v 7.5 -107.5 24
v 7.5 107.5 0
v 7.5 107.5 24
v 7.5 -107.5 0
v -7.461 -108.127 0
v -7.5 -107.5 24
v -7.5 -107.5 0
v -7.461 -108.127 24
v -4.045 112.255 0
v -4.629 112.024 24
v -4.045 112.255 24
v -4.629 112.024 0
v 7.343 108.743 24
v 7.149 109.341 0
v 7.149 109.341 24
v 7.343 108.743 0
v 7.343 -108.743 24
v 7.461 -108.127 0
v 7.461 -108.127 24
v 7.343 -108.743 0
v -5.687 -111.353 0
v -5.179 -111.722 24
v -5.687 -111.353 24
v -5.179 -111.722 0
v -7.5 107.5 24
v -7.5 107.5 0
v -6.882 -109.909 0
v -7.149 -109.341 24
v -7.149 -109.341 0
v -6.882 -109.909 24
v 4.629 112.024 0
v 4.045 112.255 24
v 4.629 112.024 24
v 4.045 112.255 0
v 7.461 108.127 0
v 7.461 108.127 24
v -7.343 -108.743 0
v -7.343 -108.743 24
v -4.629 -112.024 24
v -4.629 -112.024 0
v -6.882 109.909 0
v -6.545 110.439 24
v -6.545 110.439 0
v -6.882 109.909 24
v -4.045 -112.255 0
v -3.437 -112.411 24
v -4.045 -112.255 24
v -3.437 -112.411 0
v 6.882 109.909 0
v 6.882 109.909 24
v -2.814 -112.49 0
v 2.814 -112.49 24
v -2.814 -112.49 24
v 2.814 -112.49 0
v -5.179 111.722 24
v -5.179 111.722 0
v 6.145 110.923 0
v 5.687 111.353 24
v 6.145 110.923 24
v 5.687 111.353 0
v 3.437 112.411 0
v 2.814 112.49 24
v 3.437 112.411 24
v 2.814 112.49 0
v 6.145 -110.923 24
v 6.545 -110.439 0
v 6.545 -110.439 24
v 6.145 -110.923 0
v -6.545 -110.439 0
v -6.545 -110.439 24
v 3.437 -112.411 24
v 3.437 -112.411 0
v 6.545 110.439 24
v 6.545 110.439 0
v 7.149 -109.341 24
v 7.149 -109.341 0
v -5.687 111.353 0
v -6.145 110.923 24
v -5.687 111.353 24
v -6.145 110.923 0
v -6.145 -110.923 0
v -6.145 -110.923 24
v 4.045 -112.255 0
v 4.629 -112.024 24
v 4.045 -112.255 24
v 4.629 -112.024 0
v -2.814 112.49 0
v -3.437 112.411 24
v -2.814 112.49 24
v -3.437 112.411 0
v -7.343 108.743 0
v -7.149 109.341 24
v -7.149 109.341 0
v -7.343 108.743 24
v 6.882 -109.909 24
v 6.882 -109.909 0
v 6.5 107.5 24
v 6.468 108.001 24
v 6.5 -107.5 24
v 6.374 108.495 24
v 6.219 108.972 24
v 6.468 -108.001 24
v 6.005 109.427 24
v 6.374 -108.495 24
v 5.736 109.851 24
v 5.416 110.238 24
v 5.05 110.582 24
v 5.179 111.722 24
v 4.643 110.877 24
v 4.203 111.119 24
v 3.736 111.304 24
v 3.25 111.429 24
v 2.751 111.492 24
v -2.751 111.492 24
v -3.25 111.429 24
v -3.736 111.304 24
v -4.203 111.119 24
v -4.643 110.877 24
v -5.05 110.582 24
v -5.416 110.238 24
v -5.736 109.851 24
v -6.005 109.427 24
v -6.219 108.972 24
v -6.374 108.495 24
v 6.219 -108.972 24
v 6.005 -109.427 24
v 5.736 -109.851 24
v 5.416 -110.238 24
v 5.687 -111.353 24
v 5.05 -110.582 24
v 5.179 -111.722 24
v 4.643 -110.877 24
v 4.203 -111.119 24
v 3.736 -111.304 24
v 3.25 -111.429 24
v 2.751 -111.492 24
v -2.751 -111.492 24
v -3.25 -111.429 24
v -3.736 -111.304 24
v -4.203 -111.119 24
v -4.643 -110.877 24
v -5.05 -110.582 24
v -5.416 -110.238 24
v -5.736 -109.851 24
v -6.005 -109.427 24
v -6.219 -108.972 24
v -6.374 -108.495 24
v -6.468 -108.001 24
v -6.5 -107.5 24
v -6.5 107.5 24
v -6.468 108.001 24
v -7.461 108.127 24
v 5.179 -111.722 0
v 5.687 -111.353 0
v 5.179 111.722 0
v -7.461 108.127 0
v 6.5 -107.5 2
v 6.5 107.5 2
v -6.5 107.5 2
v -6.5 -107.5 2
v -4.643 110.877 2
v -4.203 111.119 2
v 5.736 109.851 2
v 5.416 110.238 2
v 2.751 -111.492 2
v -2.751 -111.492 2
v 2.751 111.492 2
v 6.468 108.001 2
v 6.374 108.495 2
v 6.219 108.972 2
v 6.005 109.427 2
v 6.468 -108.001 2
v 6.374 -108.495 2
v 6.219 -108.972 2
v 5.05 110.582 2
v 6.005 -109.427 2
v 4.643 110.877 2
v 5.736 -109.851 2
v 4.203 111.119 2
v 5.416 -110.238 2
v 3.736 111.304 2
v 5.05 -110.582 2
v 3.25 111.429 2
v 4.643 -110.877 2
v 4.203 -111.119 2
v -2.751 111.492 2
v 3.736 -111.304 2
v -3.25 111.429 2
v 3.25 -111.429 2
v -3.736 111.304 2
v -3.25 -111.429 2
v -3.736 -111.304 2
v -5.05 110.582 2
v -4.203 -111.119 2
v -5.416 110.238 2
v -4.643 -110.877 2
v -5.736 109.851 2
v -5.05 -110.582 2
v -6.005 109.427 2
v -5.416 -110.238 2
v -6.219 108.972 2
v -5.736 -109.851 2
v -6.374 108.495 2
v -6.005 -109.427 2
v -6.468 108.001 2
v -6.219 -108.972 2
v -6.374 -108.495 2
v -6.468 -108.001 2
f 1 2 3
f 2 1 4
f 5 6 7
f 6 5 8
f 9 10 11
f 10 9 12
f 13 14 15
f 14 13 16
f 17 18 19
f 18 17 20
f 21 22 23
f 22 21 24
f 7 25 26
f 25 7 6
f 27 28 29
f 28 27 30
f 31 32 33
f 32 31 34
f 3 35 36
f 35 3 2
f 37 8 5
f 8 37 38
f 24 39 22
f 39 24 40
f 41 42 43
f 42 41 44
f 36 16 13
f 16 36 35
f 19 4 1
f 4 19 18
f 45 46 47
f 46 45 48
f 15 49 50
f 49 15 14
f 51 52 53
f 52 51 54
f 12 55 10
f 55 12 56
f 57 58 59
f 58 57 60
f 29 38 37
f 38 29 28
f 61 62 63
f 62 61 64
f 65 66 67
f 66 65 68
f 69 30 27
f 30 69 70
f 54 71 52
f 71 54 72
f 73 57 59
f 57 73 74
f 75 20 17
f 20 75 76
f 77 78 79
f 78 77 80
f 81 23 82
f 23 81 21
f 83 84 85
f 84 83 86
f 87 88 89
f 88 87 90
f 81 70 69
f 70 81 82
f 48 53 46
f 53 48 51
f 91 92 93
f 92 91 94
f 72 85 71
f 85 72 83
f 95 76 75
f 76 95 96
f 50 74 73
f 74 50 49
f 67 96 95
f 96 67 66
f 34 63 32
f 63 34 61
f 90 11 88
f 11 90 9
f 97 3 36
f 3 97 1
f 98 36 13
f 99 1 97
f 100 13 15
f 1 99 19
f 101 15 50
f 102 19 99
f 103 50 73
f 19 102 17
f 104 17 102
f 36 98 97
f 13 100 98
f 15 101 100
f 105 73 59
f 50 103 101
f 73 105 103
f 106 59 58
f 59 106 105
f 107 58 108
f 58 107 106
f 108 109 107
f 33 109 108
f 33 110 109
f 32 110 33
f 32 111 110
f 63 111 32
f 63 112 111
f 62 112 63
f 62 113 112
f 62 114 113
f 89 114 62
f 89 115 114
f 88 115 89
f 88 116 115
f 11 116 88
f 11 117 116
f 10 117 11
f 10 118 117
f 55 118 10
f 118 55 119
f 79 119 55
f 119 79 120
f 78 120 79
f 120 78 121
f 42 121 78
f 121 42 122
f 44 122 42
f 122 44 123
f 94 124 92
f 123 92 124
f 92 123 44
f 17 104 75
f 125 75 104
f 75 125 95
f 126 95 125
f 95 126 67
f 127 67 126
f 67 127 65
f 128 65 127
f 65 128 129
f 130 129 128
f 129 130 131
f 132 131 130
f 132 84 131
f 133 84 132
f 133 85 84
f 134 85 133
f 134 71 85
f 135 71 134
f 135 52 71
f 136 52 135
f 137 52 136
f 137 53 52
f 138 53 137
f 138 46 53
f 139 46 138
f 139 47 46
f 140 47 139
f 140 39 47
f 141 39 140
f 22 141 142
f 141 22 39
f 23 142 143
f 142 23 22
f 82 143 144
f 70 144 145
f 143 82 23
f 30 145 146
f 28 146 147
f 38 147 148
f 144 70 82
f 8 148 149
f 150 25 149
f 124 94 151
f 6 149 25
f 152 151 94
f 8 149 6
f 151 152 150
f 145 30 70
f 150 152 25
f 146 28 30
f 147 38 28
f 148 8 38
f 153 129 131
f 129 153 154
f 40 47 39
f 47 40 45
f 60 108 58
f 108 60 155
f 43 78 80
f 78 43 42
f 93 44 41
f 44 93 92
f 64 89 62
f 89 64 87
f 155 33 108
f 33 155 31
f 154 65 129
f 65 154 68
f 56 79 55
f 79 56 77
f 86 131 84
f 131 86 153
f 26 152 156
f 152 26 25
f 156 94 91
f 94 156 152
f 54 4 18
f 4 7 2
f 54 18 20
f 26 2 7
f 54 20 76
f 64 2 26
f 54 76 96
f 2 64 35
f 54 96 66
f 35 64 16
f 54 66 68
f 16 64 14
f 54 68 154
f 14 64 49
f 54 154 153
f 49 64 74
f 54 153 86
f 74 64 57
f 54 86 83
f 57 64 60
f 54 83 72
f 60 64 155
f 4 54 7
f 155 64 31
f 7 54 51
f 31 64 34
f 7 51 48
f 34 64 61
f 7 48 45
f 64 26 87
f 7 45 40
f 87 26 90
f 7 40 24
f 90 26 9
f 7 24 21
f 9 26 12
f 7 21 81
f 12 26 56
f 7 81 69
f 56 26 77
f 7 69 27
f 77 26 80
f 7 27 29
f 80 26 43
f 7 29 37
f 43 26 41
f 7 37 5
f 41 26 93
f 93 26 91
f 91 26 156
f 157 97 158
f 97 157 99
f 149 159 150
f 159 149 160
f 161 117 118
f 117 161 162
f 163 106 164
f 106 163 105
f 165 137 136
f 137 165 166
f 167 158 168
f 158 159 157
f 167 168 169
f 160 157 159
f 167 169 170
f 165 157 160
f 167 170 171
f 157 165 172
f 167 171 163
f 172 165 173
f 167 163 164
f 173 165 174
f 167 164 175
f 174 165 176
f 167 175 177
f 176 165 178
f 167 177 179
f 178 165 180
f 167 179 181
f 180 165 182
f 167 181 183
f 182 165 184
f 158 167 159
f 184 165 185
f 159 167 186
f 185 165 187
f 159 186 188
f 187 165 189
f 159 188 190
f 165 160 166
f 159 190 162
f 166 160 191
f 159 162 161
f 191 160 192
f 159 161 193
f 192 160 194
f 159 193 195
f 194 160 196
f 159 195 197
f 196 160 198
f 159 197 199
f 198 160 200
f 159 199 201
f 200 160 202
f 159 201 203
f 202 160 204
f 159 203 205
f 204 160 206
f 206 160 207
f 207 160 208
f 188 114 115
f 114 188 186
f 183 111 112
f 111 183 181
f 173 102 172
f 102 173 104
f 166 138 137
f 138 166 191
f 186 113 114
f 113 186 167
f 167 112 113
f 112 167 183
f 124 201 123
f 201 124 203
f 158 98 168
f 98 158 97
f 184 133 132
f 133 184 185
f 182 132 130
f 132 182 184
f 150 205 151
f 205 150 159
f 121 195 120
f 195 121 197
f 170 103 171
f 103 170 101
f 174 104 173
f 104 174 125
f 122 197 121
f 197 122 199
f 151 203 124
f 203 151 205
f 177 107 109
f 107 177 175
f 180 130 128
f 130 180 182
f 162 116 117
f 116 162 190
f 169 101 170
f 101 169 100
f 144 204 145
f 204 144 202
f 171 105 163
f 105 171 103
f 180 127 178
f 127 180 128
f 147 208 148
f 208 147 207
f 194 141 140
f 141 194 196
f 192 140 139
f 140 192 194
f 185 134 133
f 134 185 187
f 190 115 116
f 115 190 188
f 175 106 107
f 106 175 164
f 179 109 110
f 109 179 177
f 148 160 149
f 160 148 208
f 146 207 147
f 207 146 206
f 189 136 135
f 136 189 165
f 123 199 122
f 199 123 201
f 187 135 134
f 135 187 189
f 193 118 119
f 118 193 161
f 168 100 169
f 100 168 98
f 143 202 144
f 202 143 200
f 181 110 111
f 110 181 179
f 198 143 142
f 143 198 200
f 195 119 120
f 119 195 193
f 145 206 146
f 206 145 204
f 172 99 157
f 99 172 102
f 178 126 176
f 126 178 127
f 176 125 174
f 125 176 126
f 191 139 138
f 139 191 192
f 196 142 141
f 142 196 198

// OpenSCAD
$fn = 50;


difference() {
	union() {
		hull() {
			translate(v = [-2.5000000000, 107.5000000000, 0]) {
				cylinder(h = 24, r = 5);
			}
			translate(v = [2.5000000000, 107.5000000000, 0]) {
				cylinder(h = 24, r = 5);
			}
			translate(v = [-2.5000000000, -107.5000000000, 0]) {
				cylinder(h = 24, r = 5);
			}
			translate(v = [2.5000000000, -107.5000000000, 0]) {
				cylinder(h = 24, r = 5);
			}
		}
	}
	union() {
		translate(v = [0, 0, 2]) {
			hull() {
				translate(v = [-2.5000000000, 107.5000000000, 0]) {
					cylinder(h = 22, r = 4);
				}
				translate(v = [2.5000000000, 107.5000000000, 0]) {
					cylinder(h = 22, r = 4);
				}
				translate(v = [-2.5000000000, -107.5000000000, 0]) {
					cylinder(h = 22, r = 4);
				}
				translate(v = [2.5000000000, -107.5000000000, 0]) {
					cylinder(h = 22, r = 4);
				}
			}
		}
	}
}
